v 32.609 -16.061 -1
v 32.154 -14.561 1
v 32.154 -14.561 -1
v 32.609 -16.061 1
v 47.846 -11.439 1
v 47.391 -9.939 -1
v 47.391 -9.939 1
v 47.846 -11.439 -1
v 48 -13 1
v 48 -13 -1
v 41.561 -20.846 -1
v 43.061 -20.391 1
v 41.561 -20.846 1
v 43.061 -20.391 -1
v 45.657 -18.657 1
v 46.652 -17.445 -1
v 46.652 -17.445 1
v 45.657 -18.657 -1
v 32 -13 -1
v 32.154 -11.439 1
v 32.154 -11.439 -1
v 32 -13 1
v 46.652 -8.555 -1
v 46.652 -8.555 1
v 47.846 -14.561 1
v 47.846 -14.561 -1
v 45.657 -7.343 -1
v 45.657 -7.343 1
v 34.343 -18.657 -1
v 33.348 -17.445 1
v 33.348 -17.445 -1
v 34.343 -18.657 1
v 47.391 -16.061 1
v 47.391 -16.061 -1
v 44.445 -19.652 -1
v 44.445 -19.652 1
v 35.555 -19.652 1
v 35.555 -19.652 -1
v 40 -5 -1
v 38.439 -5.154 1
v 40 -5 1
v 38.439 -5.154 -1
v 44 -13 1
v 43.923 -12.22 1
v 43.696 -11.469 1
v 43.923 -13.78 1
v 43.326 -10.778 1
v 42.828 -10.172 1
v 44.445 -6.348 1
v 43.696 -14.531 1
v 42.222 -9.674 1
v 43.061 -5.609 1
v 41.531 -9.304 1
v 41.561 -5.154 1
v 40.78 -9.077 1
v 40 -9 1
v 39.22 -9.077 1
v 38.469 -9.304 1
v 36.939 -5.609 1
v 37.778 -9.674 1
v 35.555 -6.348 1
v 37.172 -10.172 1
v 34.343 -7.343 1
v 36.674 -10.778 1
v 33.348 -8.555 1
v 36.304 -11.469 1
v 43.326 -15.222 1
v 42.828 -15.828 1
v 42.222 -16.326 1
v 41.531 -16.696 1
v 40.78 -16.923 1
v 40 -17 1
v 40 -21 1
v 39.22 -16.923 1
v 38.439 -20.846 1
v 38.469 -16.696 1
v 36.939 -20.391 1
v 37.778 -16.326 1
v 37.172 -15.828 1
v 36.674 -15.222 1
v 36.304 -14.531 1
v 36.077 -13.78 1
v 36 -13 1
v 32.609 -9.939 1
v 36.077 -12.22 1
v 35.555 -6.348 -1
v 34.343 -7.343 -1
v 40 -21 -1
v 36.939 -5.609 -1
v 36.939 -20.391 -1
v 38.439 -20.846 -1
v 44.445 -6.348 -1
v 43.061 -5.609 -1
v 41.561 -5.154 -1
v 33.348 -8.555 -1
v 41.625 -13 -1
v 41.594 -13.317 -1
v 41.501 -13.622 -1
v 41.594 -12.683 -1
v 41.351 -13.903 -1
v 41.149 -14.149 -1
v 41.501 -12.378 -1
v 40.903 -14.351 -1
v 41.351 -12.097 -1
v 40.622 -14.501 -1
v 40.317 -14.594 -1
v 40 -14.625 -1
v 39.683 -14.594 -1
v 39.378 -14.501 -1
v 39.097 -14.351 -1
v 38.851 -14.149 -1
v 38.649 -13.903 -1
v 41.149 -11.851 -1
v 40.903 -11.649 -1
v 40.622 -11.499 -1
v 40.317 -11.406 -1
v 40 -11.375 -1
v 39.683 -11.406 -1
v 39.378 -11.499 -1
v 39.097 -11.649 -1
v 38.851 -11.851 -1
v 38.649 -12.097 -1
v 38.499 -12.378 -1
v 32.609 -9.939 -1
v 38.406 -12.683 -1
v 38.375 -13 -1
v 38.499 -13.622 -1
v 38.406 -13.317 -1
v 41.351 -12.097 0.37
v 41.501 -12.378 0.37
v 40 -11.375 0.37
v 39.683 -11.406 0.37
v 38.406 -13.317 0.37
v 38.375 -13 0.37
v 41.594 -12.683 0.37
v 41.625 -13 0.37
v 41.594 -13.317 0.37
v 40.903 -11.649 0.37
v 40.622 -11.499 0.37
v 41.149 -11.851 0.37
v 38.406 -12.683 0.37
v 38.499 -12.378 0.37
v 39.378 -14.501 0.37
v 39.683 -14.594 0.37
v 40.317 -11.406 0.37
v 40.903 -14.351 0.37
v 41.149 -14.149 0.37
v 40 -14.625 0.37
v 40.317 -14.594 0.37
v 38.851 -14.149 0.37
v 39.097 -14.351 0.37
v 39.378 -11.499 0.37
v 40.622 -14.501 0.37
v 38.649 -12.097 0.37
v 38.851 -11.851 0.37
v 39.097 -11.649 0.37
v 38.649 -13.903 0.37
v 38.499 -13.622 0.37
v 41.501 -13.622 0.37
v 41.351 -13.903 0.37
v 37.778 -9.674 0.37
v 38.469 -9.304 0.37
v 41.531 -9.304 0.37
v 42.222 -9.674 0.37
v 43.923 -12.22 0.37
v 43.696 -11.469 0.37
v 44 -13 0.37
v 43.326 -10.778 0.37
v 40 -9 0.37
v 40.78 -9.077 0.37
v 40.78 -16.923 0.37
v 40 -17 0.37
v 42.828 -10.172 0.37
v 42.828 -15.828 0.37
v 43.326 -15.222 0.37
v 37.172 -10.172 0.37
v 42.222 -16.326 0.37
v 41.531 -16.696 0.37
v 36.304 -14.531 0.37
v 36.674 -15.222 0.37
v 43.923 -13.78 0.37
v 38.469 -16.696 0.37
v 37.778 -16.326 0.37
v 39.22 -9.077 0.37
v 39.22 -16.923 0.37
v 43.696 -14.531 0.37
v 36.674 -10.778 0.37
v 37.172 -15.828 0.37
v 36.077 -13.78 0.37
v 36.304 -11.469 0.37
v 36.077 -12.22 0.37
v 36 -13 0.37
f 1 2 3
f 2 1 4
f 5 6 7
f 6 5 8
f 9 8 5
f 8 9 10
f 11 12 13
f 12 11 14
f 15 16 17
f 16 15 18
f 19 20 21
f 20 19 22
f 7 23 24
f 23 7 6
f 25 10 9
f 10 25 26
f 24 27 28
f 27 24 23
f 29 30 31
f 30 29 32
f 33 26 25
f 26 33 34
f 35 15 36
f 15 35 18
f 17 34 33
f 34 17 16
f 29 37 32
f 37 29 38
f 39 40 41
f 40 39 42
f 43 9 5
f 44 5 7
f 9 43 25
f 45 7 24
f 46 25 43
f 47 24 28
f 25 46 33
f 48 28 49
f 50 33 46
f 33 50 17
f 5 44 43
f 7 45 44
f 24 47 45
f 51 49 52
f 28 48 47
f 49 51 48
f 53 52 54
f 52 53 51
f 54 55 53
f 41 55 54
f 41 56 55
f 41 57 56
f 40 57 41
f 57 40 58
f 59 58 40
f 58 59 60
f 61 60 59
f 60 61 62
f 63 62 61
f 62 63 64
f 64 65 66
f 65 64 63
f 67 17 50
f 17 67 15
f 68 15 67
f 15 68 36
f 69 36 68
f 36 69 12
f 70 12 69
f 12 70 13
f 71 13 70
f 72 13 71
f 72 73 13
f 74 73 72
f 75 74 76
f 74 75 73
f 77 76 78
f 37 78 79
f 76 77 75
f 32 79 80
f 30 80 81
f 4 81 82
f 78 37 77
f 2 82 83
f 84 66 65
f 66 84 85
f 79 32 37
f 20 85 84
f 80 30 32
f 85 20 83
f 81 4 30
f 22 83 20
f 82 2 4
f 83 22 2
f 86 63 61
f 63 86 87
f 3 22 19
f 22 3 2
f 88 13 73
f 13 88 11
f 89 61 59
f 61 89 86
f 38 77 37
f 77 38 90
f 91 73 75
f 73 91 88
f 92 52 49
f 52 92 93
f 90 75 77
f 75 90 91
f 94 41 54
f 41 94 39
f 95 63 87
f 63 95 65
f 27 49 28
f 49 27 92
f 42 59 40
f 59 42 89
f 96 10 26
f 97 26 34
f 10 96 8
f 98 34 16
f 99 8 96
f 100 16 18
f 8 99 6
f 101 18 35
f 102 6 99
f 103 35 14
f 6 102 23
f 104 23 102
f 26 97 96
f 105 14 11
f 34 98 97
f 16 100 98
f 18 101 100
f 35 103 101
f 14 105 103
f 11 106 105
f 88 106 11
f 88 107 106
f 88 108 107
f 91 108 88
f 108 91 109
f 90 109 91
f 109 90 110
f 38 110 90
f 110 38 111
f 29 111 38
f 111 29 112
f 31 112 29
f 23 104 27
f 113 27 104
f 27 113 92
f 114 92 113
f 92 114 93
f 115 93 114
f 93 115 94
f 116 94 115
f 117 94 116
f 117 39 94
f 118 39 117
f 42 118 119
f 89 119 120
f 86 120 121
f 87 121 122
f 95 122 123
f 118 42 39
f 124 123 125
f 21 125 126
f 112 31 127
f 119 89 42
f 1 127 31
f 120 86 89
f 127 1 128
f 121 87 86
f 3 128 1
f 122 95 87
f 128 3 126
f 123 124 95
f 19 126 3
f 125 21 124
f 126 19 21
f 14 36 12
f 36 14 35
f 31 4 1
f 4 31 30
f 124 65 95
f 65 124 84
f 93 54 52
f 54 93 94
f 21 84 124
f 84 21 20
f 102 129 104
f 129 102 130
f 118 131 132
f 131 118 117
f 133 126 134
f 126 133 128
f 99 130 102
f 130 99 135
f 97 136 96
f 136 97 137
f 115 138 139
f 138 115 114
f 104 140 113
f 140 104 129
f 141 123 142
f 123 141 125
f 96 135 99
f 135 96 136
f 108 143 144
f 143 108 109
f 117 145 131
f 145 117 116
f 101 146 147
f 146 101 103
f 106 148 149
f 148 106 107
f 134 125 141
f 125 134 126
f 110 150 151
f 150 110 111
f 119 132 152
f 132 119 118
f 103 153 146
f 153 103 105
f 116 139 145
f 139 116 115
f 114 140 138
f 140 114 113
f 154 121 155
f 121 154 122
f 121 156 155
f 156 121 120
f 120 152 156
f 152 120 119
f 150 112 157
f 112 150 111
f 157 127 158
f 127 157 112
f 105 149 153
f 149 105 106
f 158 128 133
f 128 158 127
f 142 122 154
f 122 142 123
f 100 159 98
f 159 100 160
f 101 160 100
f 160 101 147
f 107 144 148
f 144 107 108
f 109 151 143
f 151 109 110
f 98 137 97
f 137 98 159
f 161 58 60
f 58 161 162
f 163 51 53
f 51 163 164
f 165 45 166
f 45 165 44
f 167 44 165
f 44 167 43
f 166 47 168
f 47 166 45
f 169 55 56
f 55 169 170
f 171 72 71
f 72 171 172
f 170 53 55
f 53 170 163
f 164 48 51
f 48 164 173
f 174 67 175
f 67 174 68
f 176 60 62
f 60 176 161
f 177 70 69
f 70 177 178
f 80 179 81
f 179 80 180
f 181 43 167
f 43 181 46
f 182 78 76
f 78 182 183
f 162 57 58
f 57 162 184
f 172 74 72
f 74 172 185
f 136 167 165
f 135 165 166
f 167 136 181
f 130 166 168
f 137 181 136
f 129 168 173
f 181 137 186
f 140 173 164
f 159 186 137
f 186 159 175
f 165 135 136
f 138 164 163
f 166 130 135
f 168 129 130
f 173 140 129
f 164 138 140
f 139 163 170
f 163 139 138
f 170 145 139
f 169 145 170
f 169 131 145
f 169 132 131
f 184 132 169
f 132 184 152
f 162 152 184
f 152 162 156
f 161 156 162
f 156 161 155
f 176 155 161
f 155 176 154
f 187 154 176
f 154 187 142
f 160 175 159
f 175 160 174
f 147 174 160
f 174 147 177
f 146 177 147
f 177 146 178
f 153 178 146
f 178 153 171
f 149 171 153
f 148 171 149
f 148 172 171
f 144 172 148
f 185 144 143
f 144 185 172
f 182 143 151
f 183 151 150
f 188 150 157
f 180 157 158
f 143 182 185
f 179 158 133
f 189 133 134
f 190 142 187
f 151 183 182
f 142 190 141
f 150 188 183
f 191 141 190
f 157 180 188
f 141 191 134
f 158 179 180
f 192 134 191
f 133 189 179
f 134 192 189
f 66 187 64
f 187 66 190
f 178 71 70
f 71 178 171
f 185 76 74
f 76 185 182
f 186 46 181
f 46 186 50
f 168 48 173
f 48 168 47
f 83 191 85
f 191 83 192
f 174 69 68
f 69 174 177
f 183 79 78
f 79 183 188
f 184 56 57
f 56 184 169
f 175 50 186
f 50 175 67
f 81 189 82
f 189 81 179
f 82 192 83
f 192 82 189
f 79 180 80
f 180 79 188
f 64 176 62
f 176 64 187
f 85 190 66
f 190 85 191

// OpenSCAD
//!OpenSCAD

DRAFT = 1; // switch off for potentially higher quality final render
smooth = DRAFT == 1 ? 32 : 128;
pad = 0.01;
$fn = smooth;

// Cookie cutter dimensions
base_h = 3;
feature_h = 3;
cut_base_h = 3;
cut_h = 20;
cut_w = 80;
cut_l = 70;

// Nail dimensions
nail_head_h = 0.75;
nail_head_d = 8;
nail_head_r = nail_head_d / 2;
nail_shaft_d = 3.25;
nail_shaft_r = nail_shaft_d / 2;

// Cutter (heart outline with "tall" outline)
union()
{
    translate([0,0,cut_base_h-pad])
    linear_extrude(height=cut_h)
    import(file="EveHeartFace.dxf", layer="CutterOutline", center=true);
    linear_extrude(height=cut_base_h)
    import(file="EveHeartFace.dxf", layer="CutterBase", center=true);
}

// Features (heart shape with Eve's face)
translate([0,cut_l,0])
union()
{
    linear_extrude(height=base_h)
    import(file="EveHeartFace.dxf", layer="Heart", center=true);

    translate([0,0,base_h-pad])
    linear_extrude(height=feature_h)
    difference(){
        import(file="EveHeartFace.dxf", layer="Face", center=true);
        import(file="EveHeartFace.dxf", layer="Eyes", center=true);
    }
}

// Circular "patch" to cover/secure nail head to cookie cutter feature plate
!translate([cut_w / 2, - nail_head_r * 2 - 5, 0])
difference()
{
    cylinder(h=2, r=nail_head_r * 2, center=true);
    #cylinder(h=2+pad, r=nail_shaft_r, center=true);
    translate([0,0,nail_head_h])cylinder(h=nail_head_h+pad, r=nail_head_r, center=true);
}
